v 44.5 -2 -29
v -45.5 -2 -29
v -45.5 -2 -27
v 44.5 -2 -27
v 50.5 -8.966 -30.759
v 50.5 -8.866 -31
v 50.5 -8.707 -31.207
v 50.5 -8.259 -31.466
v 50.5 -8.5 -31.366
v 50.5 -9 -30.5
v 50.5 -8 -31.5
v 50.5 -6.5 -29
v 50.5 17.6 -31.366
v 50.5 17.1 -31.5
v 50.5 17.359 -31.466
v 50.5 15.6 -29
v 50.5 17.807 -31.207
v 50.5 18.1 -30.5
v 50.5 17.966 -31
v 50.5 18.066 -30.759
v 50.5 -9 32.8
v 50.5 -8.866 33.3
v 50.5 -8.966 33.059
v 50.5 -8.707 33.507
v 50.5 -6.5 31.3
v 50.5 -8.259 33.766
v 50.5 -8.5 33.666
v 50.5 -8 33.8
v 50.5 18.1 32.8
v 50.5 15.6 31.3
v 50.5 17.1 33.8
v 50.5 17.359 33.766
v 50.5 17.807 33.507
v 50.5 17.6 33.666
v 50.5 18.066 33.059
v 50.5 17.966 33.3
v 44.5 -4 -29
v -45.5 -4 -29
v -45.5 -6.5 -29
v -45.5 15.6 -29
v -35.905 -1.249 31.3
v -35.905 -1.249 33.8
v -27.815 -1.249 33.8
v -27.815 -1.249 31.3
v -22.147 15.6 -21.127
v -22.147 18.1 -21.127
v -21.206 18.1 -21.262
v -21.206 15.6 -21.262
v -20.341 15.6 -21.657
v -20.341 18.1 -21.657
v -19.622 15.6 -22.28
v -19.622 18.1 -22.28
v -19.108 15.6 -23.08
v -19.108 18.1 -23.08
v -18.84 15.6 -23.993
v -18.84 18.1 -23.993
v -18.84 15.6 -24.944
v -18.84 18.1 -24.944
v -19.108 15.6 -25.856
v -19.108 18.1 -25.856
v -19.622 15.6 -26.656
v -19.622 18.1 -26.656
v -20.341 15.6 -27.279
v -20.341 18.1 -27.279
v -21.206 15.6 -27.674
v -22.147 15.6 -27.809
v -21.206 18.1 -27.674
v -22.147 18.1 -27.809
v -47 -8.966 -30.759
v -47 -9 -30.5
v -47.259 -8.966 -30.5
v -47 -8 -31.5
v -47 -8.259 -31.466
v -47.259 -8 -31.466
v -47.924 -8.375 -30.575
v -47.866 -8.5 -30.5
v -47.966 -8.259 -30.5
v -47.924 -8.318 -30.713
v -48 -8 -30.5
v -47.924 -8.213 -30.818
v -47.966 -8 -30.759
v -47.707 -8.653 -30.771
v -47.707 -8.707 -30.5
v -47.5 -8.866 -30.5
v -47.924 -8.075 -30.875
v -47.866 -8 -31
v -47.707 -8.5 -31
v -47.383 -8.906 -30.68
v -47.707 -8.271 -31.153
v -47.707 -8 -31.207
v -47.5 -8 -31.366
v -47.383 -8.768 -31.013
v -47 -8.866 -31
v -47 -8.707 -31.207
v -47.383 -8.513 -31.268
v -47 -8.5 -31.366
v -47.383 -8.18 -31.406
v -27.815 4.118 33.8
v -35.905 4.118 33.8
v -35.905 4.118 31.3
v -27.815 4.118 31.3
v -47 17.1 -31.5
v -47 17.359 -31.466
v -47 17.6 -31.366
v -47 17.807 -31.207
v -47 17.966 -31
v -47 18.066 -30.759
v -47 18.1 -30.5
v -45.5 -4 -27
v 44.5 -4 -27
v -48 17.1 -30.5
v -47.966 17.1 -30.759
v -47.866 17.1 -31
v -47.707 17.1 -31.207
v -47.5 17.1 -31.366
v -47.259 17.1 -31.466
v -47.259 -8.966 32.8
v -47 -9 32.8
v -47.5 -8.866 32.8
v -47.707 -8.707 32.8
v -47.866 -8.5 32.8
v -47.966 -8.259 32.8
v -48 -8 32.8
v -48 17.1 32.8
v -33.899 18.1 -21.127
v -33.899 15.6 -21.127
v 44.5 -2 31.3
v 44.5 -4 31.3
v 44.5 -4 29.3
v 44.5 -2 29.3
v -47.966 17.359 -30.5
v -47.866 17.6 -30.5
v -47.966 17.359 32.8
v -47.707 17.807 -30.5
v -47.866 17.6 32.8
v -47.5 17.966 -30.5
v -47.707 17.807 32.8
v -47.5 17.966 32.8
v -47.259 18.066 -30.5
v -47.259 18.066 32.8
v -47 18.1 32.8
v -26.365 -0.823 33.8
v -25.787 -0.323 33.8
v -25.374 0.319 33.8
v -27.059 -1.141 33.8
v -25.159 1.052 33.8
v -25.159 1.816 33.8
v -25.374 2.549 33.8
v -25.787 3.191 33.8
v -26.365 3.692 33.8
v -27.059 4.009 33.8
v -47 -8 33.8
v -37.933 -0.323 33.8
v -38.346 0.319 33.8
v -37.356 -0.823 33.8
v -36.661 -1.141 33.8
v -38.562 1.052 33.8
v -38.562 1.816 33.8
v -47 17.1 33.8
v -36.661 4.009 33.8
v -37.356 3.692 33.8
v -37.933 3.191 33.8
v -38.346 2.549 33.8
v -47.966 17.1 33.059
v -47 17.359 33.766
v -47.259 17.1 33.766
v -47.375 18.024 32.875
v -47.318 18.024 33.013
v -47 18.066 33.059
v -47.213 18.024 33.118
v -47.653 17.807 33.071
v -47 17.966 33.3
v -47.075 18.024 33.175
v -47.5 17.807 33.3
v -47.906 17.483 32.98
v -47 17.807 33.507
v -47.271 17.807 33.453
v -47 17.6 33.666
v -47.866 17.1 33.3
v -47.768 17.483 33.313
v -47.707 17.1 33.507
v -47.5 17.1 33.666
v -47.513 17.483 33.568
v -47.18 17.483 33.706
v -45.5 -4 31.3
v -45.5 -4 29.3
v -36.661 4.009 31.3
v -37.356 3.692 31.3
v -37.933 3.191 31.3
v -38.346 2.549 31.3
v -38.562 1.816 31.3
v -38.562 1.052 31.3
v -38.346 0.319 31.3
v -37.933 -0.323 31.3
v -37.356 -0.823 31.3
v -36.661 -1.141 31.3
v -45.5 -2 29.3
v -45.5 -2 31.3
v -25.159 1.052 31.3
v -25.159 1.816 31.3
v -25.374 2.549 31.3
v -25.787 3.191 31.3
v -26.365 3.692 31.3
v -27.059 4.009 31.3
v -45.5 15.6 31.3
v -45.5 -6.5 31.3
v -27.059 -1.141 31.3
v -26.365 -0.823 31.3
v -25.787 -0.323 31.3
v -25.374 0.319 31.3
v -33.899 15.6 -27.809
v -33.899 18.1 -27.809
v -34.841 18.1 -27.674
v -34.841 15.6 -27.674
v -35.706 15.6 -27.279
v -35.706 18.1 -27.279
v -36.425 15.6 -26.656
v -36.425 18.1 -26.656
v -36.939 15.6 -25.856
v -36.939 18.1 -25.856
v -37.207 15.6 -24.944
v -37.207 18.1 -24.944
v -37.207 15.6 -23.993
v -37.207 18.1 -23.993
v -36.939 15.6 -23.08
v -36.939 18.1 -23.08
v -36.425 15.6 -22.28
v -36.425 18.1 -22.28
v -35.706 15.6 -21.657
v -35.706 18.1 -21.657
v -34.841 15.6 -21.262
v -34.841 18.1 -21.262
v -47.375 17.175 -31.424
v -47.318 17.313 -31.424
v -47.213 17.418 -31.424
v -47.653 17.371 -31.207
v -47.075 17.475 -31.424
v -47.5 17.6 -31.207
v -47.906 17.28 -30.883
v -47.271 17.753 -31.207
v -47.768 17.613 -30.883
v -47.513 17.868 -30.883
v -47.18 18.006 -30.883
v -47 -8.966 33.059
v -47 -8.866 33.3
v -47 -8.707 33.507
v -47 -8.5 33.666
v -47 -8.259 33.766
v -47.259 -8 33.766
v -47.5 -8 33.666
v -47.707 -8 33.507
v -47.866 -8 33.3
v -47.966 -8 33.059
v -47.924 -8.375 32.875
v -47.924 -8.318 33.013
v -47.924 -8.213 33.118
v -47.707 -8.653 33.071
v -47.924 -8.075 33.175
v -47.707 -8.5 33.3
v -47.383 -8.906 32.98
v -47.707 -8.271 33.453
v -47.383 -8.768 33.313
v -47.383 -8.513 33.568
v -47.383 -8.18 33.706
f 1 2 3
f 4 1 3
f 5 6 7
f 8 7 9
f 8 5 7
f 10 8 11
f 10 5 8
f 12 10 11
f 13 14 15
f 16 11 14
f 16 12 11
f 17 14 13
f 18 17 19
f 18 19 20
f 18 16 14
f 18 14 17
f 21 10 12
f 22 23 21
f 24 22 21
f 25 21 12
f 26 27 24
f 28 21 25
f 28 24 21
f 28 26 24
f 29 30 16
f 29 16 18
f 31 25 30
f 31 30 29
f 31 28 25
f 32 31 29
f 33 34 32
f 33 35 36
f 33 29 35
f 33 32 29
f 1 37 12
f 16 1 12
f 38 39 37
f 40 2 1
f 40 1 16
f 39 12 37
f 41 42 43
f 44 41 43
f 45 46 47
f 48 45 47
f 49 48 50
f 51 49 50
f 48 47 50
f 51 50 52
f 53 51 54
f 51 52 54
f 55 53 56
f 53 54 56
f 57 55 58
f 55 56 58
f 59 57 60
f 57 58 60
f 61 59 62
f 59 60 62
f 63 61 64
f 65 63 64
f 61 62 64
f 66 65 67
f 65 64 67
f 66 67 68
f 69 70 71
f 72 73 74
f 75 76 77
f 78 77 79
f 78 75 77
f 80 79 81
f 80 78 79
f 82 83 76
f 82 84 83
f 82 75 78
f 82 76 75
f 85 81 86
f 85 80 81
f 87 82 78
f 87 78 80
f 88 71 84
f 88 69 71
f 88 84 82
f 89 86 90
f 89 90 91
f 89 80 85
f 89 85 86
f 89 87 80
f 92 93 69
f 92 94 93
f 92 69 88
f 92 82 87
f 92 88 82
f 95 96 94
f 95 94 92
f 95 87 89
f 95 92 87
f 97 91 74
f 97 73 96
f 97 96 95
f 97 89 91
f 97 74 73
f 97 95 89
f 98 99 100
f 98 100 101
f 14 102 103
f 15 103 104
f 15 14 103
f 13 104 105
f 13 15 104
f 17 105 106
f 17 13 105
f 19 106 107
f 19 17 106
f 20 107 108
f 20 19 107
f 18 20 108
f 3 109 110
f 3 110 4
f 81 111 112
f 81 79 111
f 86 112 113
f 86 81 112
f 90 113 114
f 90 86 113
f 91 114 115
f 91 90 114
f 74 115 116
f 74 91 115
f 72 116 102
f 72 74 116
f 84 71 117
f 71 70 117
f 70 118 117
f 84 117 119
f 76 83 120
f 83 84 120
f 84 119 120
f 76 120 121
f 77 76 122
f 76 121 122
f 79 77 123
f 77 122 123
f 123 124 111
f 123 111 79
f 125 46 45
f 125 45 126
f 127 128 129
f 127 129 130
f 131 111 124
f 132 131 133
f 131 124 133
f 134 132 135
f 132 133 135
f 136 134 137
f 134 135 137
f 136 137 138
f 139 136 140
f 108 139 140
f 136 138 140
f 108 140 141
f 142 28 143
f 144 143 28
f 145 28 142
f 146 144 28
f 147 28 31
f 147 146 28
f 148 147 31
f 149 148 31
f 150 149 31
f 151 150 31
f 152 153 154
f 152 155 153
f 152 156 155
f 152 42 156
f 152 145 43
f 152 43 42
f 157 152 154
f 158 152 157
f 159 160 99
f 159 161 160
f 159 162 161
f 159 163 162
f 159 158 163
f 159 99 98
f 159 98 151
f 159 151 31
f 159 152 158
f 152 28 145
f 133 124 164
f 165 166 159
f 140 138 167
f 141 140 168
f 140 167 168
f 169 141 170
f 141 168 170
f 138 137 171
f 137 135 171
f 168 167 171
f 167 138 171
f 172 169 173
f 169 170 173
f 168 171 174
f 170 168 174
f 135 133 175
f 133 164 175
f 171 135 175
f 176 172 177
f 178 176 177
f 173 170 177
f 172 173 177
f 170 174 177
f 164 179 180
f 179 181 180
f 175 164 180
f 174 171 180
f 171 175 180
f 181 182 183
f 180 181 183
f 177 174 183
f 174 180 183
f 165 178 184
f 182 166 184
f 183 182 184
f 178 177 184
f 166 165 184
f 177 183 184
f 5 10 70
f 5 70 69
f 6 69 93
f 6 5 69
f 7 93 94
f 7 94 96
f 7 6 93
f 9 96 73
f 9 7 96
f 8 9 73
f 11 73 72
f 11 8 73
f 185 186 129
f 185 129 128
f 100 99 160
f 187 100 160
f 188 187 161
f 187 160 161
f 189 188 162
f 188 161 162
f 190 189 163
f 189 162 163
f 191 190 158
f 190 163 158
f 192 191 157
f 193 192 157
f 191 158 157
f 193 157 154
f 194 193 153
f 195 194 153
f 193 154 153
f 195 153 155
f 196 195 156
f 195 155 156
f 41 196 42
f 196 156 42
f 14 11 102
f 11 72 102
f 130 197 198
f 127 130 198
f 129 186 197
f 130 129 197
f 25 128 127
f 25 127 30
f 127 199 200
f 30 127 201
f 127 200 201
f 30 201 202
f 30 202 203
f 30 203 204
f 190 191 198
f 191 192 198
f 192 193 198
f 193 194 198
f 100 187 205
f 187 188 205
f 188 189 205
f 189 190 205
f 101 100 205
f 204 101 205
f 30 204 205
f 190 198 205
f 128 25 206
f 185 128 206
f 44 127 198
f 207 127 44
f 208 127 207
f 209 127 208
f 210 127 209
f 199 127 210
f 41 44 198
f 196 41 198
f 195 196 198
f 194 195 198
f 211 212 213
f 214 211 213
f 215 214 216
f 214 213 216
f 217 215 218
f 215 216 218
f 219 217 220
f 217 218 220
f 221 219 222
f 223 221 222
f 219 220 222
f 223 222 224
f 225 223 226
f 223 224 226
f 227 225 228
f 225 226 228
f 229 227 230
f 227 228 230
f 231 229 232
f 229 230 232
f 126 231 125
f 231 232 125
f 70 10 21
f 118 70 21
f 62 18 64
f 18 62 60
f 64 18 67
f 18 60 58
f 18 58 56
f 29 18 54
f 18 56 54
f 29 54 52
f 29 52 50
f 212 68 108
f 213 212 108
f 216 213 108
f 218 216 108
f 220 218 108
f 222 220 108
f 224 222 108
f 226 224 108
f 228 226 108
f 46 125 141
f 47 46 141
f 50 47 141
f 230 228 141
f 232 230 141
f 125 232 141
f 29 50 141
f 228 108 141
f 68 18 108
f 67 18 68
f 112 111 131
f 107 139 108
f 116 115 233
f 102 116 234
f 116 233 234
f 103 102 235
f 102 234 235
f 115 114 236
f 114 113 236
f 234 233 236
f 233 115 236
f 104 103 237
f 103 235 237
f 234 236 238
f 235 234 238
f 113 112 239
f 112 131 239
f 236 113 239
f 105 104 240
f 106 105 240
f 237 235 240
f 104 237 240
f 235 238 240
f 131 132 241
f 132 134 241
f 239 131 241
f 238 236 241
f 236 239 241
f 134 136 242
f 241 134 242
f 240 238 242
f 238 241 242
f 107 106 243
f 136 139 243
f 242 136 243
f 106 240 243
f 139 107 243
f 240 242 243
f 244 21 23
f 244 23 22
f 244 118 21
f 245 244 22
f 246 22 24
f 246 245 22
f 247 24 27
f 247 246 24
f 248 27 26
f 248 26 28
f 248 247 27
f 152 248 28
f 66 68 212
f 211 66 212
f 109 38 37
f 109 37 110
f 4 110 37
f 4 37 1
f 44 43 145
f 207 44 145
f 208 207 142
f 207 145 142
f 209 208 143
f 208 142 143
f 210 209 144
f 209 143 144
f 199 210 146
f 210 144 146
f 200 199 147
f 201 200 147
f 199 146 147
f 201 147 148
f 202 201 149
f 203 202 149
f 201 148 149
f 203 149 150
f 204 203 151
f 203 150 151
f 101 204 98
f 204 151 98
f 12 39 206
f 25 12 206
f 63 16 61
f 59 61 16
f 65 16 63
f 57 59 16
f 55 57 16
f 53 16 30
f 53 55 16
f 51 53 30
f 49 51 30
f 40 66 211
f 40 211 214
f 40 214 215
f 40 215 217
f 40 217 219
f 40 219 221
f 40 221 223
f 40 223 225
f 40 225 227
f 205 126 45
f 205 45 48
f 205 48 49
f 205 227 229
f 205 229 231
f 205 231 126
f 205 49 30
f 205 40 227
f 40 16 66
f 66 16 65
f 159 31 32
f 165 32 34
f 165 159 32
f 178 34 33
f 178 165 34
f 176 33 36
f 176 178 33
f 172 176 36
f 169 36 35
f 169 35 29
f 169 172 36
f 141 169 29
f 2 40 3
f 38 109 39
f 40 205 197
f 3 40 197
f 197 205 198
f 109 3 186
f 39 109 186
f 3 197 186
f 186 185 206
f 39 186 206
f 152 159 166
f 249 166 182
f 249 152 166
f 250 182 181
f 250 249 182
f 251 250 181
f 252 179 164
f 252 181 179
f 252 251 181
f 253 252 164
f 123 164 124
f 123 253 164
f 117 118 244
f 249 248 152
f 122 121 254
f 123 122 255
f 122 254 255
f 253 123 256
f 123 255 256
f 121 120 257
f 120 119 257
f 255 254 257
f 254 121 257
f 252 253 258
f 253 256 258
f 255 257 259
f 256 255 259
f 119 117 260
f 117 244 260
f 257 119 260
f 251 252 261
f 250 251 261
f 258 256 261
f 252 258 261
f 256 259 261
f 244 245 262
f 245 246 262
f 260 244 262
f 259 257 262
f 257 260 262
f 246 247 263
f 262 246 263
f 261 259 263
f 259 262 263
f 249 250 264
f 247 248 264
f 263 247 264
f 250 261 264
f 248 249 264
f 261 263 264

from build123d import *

# Parameters (mm, degrees)
SKETCH003_W      = 27.1
SKETCH003_H      = 65.3
EXTRUDE002_DEPTH = 2.5
SKETCH004_W      = 2
SKETCH004_H      = 2
PAD003_DEPTH     = 90
SKETCH005_W      = 27.1
SKETCH005_H      = 65.3
SKETCH005_W_2    = 22.1
SKETCH005_H_2    = 60.3
PAD004_DEPTH     = 96
POCKET_DEPTH     = 2.5
POCKET001_DEPTH  = 2.5
FILLET_R         = 1


with BuildPart() as part:
    # Sketch003 → Extrude002 (new body)
    with BuildSketch(Plane(origin=(-45.5, -6.5, -29), x_dir=(0, -1, 0), z_dir=(-1, 0, 0))):
        with Locations((-11.05, 30.15)):
            Rectangle(SKETCH003_W, SKETCH003_H)
    extrude(amount=EXTRUDE002_DEPTH)

    # Sketch004 → Pad003 (new body)
    with BuildSketch(Plane.YZ.offset(-45.5)):
        with Locations((-3, -28)):
            Rectangle(SKETCH004_W, SKETCH004_H)
        with Locations((-3, 30.3)):
            Rectangle(SKETCH004_W, SKETCH004_H)
    extrude(amount=PAD003_DEPTH)

    # Sketch005 → Pad004 (new body)
    with BuildSketch(Plane.YZ.offset(-45.5)):
        with Locations((4.55, 1.15)):
            Rectangle(SKETCH005_W, SKETCH005_H)
        with Locations((4.55, 1.15)):
            Rectangle(SKETCH005_W_2, SKETCH005_H_2, mode=Mode.SUBTRACT)
    extrude(amount=PAD004_DEPTH)

    # Sketch006 → Pocket (cut)
    with BuildSketch(Plane.XY.offset(33.8)):
        with BuildLine():
            ThreePointArc((-35.90548, 4.1175), (-38.58891, 1.43407), (-35.90548, -1.24936))
            Line((-35.90548, -1.24936), (-27.8154, -1.24936))
            ThreePointArc((-27.8154, -1.24936), (-25.13197, 1.43407), (-27.8154, 4.1175))
            Line((-35.90548, 4.1175), (-27.8154, 4.1175))
        make_face()
    extrude(amount=-POCKET_DEPTH, mode=Mode.SUBTRACT)

    # Sketch007 → Pocket001 (cut)
    with BuildSketch(Plane(origin=(0, 18.1, 0), x_dir=(-1, 0, 0), z_dir=(0, 1, 0))):
        with BuildLine():
            ThreePointArc((22.1471, -21.12672), (18.8058, -24.46802), (22.1471, -27.80932))
            Line((22.1471, -27.80932), (33.8994, -27.80932))
            ThreePointArc((33.8994, -27.80932), (37.2407, -24.46802), (33.8994, -21.12672))
            Line((22.1471, -21.12672), (33.8994, -21.12672))
        make_face()
    extrude(amount=-POCKET001_DEPTH, mode=Mode.SUBTRACT)

    # Fillet
    fillet_edges = [part.edges().sort_by_distance(p)[0] for p in [
        (2.5, -9, 33.8),
        (2.5, -9, -31.5),
        (-46.75, -9, -31.5),
        (-46.75, -9, 33.8),
        (-48, -9, 1.15),
        (-48, 4.55, 33.8),
        (-48, 18.1, 1.15),
        (-48, 4.55, -31.5),
        (2.5, 18.1, 33.8),
        (-46.75, 18.1, 33.8),
        (-46.75, 18.1, -31.5),
        (2.5, 18.1, -31.5),
    ]]
    fillet(fillet_edges, radius=FILLET_R)


solid = part.part
